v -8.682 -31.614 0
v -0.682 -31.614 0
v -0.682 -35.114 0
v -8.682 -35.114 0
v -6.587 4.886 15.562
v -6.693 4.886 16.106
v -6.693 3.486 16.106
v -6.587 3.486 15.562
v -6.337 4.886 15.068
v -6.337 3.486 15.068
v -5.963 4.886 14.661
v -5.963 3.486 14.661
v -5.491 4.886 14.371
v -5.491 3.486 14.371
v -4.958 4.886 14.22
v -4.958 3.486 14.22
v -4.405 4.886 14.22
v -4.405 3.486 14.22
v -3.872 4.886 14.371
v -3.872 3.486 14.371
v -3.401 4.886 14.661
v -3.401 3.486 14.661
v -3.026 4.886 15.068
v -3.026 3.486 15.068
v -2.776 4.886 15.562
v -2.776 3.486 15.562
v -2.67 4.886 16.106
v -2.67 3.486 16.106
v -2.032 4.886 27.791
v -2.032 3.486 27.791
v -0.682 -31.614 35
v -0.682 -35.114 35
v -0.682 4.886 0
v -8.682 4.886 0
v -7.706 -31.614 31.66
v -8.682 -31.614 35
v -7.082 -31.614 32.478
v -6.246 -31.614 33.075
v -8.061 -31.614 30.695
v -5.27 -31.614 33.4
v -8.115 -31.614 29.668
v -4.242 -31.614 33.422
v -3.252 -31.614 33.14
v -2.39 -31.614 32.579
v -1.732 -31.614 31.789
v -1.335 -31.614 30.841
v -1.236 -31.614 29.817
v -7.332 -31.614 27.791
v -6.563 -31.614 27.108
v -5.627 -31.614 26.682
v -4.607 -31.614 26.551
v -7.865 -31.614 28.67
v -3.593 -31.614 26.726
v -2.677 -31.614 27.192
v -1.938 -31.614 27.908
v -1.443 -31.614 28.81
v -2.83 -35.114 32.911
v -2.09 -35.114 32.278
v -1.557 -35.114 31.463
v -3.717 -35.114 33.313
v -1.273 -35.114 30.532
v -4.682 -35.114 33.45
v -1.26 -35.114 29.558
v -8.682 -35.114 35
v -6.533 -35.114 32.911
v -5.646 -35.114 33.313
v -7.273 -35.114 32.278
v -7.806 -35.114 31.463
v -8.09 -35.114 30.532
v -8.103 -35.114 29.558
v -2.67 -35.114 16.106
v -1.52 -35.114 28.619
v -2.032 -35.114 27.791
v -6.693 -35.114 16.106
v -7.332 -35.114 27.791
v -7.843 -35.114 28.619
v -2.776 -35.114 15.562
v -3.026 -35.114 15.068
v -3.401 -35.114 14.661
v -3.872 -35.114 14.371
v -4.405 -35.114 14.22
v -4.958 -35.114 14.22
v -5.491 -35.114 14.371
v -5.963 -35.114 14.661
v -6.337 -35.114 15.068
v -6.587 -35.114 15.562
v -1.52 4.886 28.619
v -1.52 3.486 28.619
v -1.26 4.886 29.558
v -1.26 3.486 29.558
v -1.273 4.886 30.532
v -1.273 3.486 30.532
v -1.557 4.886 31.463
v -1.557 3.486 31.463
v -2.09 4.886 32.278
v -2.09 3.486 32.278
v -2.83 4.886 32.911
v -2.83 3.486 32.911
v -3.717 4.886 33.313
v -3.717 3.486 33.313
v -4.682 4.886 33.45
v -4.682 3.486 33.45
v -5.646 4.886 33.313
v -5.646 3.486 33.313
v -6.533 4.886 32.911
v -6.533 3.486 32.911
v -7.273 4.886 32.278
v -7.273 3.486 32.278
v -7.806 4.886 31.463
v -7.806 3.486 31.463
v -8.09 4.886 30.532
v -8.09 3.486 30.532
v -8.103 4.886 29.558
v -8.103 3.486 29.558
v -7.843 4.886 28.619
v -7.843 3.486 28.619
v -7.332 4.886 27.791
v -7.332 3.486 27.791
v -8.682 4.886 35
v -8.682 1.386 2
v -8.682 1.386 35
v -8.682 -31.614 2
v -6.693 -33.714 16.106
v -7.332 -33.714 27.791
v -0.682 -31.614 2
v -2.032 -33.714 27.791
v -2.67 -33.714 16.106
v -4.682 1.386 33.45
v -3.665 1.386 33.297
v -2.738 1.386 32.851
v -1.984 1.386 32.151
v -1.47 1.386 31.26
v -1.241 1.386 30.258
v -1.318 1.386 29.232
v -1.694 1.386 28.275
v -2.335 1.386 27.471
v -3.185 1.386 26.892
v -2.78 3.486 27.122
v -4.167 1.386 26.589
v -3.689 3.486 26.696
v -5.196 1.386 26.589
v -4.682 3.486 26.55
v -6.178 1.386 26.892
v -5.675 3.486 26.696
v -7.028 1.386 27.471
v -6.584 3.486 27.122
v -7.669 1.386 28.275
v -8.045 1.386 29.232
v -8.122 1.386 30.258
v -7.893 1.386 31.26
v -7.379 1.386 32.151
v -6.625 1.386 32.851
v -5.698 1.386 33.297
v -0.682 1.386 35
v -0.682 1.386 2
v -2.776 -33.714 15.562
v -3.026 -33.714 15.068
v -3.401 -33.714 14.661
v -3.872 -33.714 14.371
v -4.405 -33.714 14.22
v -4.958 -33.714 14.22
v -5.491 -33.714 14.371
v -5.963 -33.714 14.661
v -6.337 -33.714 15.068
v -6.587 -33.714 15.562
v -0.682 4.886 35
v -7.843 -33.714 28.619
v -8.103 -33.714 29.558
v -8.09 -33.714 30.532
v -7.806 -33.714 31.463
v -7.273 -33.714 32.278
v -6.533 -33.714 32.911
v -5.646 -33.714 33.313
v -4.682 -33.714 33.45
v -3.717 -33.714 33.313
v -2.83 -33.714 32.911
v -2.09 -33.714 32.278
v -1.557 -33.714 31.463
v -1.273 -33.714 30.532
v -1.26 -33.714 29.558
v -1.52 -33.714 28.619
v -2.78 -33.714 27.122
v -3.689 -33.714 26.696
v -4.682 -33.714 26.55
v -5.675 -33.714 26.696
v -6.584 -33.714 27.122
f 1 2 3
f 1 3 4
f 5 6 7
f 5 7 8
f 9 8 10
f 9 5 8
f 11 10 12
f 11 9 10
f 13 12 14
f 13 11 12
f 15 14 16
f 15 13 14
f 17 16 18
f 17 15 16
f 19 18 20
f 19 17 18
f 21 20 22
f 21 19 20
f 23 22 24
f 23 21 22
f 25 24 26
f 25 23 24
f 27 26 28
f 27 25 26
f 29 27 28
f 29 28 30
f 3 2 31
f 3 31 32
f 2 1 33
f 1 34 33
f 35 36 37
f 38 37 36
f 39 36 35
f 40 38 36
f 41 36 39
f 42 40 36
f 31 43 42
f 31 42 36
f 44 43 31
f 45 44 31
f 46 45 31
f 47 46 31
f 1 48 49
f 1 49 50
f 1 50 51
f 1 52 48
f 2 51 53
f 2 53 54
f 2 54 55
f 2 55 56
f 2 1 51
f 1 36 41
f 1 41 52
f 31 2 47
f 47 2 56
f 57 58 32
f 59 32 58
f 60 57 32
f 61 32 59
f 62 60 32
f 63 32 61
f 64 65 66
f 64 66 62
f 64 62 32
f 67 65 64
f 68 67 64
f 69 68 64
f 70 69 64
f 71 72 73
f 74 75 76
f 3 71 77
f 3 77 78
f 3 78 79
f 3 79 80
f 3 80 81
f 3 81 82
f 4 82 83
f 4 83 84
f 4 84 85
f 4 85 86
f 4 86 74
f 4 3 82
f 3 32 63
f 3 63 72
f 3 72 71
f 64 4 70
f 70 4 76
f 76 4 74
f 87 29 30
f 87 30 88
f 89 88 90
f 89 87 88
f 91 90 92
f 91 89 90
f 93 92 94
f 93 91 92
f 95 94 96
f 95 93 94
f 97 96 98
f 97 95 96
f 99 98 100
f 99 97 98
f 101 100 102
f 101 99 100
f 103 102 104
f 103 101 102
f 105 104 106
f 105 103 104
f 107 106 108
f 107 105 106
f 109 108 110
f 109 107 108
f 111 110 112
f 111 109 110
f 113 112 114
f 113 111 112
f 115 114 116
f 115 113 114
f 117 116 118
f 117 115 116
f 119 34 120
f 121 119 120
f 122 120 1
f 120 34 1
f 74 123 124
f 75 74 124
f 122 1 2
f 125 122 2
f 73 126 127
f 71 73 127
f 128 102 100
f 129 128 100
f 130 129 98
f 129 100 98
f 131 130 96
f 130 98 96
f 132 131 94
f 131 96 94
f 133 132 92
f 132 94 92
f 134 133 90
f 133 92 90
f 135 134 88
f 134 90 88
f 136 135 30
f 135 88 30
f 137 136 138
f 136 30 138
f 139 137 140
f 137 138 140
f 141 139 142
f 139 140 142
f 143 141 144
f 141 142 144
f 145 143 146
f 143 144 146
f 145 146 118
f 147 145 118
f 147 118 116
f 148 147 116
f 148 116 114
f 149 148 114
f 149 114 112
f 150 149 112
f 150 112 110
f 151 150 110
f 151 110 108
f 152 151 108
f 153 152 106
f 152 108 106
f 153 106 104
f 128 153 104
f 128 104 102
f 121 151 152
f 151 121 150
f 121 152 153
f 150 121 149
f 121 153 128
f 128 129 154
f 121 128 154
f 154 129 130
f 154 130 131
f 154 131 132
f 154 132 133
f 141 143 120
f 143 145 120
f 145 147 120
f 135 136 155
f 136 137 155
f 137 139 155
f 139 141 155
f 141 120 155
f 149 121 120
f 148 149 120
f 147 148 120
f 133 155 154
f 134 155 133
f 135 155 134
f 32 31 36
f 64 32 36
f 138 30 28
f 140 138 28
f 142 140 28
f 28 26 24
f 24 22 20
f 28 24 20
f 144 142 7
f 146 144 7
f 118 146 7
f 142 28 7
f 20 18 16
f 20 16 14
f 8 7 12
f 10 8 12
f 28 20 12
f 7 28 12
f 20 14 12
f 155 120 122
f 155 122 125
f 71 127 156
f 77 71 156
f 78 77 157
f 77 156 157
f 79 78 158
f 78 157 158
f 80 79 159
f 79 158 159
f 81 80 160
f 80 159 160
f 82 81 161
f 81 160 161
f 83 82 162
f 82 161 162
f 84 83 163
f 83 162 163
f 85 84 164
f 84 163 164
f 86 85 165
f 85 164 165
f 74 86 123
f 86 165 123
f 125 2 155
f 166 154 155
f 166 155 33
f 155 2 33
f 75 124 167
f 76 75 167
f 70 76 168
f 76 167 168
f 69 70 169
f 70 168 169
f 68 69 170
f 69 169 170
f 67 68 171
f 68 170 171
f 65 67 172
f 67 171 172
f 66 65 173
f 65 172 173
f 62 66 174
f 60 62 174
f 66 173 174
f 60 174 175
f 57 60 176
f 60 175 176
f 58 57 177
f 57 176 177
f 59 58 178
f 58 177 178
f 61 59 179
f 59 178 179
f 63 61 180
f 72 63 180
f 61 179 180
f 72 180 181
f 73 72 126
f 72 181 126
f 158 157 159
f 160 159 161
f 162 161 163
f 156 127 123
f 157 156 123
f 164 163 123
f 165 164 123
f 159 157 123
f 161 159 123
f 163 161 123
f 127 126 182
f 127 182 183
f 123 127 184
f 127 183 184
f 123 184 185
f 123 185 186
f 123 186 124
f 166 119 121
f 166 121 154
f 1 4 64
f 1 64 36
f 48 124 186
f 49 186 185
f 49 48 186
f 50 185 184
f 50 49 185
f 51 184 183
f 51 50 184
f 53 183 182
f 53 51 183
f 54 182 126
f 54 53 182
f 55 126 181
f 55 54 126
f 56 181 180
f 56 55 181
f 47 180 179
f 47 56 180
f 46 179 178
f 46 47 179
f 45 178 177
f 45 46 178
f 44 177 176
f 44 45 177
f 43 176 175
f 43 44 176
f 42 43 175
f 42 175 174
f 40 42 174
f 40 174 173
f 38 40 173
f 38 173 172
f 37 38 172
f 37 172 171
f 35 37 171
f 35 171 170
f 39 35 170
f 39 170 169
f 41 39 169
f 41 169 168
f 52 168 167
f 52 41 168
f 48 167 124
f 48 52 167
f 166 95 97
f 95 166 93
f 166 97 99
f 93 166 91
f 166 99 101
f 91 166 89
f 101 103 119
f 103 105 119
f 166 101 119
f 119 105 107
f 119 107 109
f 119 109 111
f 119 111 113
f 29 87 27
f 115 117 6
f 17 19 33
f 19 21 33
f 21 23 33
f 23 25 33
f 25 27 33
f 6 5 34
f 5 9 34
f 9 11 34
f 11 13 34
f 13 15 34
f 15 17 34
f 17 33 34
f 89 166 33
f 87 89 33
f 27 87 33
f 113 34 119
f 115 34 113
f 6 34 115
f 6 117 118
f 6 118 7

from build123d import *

# Parameters (mm, degrees)
BOSS_EXTRUDE2_DEPTH   = 35
BOSS_EXTRUDE2_2_DEPTH = 35
BOSS_EXTRUDE3_DEPTH   = 2
CUT_EXTRUDE2_DEPTH    = 1.4
SKETCH5_R             = 3.450000000000001
CUT_EXTRUDE3_DEPTH    = 2.1
CUT_EXTRUDE4_START    = -1.4
CUT_EXTRUDE4_DEPTH    = 1.4
CUT_EXTRUDE5_START    = -3.5
SKETCH7_R             = 3.4500000000000144
CUT_EXTRUDE5_DEPTH    = 2.1


with BuildPart() as part:
    # Sketch2 → Boss-Extrude2 (new body)
    with BuildSketch(Plane.XY):
        Polygon((-0.6815453945675554, 4.886493048426679), (-8.681545394567557, 4.88649304842668), (-8.681545394567557, 1.3864930484266802), (-0.6815453945675554, 1.3864930484266802), align=None)
    extrude(amount=BOSS_EXTRUDE2_DEPTH)

    # Sketch2<3> → Boss-Extrude3 (add)
    with BuildSketch(Plane.XY):
        Polygon((-0.6815453945675554, 1.3864930484266802), (-8.681545394567557, 1.3864930484266802), (-8.681545394567554, -31.61350695157332), (-0.6815453945675483, -31.61350695157332), align=None)
    extrude(amount=BOSS_EXTRUDE3_DEPTH)

    # Sketch3 → Cut-Extrude2 (cut)
    with BuildSketch(Plane(origin=(5.3e-16, 4.886493048426679, 0), x_dir=(1, 0, 0), z_dir=(0, 1, 0))):
        with BuildLine():
            Line((-2.670049230365411, -16.10578751916768), (-2.031545394567679, -27.790927796562404))
            ThreePointArc((-2.031545394567679, -27.790927796562404), (-4.681545394567368, -33.45), (-7.331545394567679, -27.7909277965627))
            Line((-7.331545394567679, -27.7909277965627), (-6.6930415587699335, -16.10578751916768))
            ThreePointArc((-6.6930415587699335, -16.10578751916768), (-4.681545394567673, -14.201203572244038), (-2.670049230365411, -16.10578751916768))
        make_face()
    extrude(amount=-CUT_EXTRUDE2_DEPTH, mode=Mode.SUBTRACT)

    # Sketch5 → Cut-Extrude3 (cut)
    with BuildSketch(Plane(origin=(0, 3.4864930484266785, 0), x_dir=(1, 0, 0), z_dir=(0, 1, 0))):
        with Locations(Location((-4.681545394567557, -30.000000000000004, 0), (0, 0, 270))):
            Circle(SKETCH5_R)
    extrude(amount=-CUT_EXTRUDE3_DEPTH, mode=Mode.SUBTRACT)


with BuildPart() as body_2:
    # Sketch2 → Boss-Extrude2 2 (new body)
    with BuildSketch(Plane.XY):
        Polygon((-8.681545394567554, -35.11350695157332), (-8.681545394567554, -31.61350695157332), (-0.6815453945675478, -31.61350695157332), (-0.6815453945675509, -35.11350695157332), align=None)
    extrude(amount=BOSS_EXTRUDE2_2_DEPTH)

    # Sketch6 → Cut-Extrude4 (cut)
    with BuildSketch(Plane.XZ.offset(35.11350695157332).offset(CUT_EXTRUDE4_START)):
        with BuildLine():
            Line((-6.693041558769597, 16.105787519167798), (-7.331545394567415, 27.790927796562364))
            ThreePointArc((-7.331545394567415, 27.790927796562364), (-4.681545394567741, 33.45000000000002), (-2.0315453945674466, 27.790927796562656))
            Line((-2.0315453945674466, 27.790927796562656), (-2.670049230365082, 16.10578751916783))
            ThreePointArc((-2.670049230365082, 16.10578751916783), (-4.681545394567325, 14.201203572244175), (-6.693041558769597, 16.105787519167798))
        make_face()
    extrude(amount=CUT_EXTRUDE4_DEPTH, mode=Mode.SUBTRACT)

    # Sketch7 → Cut-Extrude5 (cut)
    with BuildSketch(Plane.XZ.offset(35.11350695157332).offset(CUT_EXTRUDE5_START)):
        with Locations(Location((-4.681545394567552, 30.000000000000004, 0), (0, 0, 219.814997755))):
            Circle(SKETCH7_R)
    extrude(amount=CUT_EXTRUDE5_DEPTH, mode=Mode.SUBTRACT)


solid = Compound([part.part, body_2.part])
